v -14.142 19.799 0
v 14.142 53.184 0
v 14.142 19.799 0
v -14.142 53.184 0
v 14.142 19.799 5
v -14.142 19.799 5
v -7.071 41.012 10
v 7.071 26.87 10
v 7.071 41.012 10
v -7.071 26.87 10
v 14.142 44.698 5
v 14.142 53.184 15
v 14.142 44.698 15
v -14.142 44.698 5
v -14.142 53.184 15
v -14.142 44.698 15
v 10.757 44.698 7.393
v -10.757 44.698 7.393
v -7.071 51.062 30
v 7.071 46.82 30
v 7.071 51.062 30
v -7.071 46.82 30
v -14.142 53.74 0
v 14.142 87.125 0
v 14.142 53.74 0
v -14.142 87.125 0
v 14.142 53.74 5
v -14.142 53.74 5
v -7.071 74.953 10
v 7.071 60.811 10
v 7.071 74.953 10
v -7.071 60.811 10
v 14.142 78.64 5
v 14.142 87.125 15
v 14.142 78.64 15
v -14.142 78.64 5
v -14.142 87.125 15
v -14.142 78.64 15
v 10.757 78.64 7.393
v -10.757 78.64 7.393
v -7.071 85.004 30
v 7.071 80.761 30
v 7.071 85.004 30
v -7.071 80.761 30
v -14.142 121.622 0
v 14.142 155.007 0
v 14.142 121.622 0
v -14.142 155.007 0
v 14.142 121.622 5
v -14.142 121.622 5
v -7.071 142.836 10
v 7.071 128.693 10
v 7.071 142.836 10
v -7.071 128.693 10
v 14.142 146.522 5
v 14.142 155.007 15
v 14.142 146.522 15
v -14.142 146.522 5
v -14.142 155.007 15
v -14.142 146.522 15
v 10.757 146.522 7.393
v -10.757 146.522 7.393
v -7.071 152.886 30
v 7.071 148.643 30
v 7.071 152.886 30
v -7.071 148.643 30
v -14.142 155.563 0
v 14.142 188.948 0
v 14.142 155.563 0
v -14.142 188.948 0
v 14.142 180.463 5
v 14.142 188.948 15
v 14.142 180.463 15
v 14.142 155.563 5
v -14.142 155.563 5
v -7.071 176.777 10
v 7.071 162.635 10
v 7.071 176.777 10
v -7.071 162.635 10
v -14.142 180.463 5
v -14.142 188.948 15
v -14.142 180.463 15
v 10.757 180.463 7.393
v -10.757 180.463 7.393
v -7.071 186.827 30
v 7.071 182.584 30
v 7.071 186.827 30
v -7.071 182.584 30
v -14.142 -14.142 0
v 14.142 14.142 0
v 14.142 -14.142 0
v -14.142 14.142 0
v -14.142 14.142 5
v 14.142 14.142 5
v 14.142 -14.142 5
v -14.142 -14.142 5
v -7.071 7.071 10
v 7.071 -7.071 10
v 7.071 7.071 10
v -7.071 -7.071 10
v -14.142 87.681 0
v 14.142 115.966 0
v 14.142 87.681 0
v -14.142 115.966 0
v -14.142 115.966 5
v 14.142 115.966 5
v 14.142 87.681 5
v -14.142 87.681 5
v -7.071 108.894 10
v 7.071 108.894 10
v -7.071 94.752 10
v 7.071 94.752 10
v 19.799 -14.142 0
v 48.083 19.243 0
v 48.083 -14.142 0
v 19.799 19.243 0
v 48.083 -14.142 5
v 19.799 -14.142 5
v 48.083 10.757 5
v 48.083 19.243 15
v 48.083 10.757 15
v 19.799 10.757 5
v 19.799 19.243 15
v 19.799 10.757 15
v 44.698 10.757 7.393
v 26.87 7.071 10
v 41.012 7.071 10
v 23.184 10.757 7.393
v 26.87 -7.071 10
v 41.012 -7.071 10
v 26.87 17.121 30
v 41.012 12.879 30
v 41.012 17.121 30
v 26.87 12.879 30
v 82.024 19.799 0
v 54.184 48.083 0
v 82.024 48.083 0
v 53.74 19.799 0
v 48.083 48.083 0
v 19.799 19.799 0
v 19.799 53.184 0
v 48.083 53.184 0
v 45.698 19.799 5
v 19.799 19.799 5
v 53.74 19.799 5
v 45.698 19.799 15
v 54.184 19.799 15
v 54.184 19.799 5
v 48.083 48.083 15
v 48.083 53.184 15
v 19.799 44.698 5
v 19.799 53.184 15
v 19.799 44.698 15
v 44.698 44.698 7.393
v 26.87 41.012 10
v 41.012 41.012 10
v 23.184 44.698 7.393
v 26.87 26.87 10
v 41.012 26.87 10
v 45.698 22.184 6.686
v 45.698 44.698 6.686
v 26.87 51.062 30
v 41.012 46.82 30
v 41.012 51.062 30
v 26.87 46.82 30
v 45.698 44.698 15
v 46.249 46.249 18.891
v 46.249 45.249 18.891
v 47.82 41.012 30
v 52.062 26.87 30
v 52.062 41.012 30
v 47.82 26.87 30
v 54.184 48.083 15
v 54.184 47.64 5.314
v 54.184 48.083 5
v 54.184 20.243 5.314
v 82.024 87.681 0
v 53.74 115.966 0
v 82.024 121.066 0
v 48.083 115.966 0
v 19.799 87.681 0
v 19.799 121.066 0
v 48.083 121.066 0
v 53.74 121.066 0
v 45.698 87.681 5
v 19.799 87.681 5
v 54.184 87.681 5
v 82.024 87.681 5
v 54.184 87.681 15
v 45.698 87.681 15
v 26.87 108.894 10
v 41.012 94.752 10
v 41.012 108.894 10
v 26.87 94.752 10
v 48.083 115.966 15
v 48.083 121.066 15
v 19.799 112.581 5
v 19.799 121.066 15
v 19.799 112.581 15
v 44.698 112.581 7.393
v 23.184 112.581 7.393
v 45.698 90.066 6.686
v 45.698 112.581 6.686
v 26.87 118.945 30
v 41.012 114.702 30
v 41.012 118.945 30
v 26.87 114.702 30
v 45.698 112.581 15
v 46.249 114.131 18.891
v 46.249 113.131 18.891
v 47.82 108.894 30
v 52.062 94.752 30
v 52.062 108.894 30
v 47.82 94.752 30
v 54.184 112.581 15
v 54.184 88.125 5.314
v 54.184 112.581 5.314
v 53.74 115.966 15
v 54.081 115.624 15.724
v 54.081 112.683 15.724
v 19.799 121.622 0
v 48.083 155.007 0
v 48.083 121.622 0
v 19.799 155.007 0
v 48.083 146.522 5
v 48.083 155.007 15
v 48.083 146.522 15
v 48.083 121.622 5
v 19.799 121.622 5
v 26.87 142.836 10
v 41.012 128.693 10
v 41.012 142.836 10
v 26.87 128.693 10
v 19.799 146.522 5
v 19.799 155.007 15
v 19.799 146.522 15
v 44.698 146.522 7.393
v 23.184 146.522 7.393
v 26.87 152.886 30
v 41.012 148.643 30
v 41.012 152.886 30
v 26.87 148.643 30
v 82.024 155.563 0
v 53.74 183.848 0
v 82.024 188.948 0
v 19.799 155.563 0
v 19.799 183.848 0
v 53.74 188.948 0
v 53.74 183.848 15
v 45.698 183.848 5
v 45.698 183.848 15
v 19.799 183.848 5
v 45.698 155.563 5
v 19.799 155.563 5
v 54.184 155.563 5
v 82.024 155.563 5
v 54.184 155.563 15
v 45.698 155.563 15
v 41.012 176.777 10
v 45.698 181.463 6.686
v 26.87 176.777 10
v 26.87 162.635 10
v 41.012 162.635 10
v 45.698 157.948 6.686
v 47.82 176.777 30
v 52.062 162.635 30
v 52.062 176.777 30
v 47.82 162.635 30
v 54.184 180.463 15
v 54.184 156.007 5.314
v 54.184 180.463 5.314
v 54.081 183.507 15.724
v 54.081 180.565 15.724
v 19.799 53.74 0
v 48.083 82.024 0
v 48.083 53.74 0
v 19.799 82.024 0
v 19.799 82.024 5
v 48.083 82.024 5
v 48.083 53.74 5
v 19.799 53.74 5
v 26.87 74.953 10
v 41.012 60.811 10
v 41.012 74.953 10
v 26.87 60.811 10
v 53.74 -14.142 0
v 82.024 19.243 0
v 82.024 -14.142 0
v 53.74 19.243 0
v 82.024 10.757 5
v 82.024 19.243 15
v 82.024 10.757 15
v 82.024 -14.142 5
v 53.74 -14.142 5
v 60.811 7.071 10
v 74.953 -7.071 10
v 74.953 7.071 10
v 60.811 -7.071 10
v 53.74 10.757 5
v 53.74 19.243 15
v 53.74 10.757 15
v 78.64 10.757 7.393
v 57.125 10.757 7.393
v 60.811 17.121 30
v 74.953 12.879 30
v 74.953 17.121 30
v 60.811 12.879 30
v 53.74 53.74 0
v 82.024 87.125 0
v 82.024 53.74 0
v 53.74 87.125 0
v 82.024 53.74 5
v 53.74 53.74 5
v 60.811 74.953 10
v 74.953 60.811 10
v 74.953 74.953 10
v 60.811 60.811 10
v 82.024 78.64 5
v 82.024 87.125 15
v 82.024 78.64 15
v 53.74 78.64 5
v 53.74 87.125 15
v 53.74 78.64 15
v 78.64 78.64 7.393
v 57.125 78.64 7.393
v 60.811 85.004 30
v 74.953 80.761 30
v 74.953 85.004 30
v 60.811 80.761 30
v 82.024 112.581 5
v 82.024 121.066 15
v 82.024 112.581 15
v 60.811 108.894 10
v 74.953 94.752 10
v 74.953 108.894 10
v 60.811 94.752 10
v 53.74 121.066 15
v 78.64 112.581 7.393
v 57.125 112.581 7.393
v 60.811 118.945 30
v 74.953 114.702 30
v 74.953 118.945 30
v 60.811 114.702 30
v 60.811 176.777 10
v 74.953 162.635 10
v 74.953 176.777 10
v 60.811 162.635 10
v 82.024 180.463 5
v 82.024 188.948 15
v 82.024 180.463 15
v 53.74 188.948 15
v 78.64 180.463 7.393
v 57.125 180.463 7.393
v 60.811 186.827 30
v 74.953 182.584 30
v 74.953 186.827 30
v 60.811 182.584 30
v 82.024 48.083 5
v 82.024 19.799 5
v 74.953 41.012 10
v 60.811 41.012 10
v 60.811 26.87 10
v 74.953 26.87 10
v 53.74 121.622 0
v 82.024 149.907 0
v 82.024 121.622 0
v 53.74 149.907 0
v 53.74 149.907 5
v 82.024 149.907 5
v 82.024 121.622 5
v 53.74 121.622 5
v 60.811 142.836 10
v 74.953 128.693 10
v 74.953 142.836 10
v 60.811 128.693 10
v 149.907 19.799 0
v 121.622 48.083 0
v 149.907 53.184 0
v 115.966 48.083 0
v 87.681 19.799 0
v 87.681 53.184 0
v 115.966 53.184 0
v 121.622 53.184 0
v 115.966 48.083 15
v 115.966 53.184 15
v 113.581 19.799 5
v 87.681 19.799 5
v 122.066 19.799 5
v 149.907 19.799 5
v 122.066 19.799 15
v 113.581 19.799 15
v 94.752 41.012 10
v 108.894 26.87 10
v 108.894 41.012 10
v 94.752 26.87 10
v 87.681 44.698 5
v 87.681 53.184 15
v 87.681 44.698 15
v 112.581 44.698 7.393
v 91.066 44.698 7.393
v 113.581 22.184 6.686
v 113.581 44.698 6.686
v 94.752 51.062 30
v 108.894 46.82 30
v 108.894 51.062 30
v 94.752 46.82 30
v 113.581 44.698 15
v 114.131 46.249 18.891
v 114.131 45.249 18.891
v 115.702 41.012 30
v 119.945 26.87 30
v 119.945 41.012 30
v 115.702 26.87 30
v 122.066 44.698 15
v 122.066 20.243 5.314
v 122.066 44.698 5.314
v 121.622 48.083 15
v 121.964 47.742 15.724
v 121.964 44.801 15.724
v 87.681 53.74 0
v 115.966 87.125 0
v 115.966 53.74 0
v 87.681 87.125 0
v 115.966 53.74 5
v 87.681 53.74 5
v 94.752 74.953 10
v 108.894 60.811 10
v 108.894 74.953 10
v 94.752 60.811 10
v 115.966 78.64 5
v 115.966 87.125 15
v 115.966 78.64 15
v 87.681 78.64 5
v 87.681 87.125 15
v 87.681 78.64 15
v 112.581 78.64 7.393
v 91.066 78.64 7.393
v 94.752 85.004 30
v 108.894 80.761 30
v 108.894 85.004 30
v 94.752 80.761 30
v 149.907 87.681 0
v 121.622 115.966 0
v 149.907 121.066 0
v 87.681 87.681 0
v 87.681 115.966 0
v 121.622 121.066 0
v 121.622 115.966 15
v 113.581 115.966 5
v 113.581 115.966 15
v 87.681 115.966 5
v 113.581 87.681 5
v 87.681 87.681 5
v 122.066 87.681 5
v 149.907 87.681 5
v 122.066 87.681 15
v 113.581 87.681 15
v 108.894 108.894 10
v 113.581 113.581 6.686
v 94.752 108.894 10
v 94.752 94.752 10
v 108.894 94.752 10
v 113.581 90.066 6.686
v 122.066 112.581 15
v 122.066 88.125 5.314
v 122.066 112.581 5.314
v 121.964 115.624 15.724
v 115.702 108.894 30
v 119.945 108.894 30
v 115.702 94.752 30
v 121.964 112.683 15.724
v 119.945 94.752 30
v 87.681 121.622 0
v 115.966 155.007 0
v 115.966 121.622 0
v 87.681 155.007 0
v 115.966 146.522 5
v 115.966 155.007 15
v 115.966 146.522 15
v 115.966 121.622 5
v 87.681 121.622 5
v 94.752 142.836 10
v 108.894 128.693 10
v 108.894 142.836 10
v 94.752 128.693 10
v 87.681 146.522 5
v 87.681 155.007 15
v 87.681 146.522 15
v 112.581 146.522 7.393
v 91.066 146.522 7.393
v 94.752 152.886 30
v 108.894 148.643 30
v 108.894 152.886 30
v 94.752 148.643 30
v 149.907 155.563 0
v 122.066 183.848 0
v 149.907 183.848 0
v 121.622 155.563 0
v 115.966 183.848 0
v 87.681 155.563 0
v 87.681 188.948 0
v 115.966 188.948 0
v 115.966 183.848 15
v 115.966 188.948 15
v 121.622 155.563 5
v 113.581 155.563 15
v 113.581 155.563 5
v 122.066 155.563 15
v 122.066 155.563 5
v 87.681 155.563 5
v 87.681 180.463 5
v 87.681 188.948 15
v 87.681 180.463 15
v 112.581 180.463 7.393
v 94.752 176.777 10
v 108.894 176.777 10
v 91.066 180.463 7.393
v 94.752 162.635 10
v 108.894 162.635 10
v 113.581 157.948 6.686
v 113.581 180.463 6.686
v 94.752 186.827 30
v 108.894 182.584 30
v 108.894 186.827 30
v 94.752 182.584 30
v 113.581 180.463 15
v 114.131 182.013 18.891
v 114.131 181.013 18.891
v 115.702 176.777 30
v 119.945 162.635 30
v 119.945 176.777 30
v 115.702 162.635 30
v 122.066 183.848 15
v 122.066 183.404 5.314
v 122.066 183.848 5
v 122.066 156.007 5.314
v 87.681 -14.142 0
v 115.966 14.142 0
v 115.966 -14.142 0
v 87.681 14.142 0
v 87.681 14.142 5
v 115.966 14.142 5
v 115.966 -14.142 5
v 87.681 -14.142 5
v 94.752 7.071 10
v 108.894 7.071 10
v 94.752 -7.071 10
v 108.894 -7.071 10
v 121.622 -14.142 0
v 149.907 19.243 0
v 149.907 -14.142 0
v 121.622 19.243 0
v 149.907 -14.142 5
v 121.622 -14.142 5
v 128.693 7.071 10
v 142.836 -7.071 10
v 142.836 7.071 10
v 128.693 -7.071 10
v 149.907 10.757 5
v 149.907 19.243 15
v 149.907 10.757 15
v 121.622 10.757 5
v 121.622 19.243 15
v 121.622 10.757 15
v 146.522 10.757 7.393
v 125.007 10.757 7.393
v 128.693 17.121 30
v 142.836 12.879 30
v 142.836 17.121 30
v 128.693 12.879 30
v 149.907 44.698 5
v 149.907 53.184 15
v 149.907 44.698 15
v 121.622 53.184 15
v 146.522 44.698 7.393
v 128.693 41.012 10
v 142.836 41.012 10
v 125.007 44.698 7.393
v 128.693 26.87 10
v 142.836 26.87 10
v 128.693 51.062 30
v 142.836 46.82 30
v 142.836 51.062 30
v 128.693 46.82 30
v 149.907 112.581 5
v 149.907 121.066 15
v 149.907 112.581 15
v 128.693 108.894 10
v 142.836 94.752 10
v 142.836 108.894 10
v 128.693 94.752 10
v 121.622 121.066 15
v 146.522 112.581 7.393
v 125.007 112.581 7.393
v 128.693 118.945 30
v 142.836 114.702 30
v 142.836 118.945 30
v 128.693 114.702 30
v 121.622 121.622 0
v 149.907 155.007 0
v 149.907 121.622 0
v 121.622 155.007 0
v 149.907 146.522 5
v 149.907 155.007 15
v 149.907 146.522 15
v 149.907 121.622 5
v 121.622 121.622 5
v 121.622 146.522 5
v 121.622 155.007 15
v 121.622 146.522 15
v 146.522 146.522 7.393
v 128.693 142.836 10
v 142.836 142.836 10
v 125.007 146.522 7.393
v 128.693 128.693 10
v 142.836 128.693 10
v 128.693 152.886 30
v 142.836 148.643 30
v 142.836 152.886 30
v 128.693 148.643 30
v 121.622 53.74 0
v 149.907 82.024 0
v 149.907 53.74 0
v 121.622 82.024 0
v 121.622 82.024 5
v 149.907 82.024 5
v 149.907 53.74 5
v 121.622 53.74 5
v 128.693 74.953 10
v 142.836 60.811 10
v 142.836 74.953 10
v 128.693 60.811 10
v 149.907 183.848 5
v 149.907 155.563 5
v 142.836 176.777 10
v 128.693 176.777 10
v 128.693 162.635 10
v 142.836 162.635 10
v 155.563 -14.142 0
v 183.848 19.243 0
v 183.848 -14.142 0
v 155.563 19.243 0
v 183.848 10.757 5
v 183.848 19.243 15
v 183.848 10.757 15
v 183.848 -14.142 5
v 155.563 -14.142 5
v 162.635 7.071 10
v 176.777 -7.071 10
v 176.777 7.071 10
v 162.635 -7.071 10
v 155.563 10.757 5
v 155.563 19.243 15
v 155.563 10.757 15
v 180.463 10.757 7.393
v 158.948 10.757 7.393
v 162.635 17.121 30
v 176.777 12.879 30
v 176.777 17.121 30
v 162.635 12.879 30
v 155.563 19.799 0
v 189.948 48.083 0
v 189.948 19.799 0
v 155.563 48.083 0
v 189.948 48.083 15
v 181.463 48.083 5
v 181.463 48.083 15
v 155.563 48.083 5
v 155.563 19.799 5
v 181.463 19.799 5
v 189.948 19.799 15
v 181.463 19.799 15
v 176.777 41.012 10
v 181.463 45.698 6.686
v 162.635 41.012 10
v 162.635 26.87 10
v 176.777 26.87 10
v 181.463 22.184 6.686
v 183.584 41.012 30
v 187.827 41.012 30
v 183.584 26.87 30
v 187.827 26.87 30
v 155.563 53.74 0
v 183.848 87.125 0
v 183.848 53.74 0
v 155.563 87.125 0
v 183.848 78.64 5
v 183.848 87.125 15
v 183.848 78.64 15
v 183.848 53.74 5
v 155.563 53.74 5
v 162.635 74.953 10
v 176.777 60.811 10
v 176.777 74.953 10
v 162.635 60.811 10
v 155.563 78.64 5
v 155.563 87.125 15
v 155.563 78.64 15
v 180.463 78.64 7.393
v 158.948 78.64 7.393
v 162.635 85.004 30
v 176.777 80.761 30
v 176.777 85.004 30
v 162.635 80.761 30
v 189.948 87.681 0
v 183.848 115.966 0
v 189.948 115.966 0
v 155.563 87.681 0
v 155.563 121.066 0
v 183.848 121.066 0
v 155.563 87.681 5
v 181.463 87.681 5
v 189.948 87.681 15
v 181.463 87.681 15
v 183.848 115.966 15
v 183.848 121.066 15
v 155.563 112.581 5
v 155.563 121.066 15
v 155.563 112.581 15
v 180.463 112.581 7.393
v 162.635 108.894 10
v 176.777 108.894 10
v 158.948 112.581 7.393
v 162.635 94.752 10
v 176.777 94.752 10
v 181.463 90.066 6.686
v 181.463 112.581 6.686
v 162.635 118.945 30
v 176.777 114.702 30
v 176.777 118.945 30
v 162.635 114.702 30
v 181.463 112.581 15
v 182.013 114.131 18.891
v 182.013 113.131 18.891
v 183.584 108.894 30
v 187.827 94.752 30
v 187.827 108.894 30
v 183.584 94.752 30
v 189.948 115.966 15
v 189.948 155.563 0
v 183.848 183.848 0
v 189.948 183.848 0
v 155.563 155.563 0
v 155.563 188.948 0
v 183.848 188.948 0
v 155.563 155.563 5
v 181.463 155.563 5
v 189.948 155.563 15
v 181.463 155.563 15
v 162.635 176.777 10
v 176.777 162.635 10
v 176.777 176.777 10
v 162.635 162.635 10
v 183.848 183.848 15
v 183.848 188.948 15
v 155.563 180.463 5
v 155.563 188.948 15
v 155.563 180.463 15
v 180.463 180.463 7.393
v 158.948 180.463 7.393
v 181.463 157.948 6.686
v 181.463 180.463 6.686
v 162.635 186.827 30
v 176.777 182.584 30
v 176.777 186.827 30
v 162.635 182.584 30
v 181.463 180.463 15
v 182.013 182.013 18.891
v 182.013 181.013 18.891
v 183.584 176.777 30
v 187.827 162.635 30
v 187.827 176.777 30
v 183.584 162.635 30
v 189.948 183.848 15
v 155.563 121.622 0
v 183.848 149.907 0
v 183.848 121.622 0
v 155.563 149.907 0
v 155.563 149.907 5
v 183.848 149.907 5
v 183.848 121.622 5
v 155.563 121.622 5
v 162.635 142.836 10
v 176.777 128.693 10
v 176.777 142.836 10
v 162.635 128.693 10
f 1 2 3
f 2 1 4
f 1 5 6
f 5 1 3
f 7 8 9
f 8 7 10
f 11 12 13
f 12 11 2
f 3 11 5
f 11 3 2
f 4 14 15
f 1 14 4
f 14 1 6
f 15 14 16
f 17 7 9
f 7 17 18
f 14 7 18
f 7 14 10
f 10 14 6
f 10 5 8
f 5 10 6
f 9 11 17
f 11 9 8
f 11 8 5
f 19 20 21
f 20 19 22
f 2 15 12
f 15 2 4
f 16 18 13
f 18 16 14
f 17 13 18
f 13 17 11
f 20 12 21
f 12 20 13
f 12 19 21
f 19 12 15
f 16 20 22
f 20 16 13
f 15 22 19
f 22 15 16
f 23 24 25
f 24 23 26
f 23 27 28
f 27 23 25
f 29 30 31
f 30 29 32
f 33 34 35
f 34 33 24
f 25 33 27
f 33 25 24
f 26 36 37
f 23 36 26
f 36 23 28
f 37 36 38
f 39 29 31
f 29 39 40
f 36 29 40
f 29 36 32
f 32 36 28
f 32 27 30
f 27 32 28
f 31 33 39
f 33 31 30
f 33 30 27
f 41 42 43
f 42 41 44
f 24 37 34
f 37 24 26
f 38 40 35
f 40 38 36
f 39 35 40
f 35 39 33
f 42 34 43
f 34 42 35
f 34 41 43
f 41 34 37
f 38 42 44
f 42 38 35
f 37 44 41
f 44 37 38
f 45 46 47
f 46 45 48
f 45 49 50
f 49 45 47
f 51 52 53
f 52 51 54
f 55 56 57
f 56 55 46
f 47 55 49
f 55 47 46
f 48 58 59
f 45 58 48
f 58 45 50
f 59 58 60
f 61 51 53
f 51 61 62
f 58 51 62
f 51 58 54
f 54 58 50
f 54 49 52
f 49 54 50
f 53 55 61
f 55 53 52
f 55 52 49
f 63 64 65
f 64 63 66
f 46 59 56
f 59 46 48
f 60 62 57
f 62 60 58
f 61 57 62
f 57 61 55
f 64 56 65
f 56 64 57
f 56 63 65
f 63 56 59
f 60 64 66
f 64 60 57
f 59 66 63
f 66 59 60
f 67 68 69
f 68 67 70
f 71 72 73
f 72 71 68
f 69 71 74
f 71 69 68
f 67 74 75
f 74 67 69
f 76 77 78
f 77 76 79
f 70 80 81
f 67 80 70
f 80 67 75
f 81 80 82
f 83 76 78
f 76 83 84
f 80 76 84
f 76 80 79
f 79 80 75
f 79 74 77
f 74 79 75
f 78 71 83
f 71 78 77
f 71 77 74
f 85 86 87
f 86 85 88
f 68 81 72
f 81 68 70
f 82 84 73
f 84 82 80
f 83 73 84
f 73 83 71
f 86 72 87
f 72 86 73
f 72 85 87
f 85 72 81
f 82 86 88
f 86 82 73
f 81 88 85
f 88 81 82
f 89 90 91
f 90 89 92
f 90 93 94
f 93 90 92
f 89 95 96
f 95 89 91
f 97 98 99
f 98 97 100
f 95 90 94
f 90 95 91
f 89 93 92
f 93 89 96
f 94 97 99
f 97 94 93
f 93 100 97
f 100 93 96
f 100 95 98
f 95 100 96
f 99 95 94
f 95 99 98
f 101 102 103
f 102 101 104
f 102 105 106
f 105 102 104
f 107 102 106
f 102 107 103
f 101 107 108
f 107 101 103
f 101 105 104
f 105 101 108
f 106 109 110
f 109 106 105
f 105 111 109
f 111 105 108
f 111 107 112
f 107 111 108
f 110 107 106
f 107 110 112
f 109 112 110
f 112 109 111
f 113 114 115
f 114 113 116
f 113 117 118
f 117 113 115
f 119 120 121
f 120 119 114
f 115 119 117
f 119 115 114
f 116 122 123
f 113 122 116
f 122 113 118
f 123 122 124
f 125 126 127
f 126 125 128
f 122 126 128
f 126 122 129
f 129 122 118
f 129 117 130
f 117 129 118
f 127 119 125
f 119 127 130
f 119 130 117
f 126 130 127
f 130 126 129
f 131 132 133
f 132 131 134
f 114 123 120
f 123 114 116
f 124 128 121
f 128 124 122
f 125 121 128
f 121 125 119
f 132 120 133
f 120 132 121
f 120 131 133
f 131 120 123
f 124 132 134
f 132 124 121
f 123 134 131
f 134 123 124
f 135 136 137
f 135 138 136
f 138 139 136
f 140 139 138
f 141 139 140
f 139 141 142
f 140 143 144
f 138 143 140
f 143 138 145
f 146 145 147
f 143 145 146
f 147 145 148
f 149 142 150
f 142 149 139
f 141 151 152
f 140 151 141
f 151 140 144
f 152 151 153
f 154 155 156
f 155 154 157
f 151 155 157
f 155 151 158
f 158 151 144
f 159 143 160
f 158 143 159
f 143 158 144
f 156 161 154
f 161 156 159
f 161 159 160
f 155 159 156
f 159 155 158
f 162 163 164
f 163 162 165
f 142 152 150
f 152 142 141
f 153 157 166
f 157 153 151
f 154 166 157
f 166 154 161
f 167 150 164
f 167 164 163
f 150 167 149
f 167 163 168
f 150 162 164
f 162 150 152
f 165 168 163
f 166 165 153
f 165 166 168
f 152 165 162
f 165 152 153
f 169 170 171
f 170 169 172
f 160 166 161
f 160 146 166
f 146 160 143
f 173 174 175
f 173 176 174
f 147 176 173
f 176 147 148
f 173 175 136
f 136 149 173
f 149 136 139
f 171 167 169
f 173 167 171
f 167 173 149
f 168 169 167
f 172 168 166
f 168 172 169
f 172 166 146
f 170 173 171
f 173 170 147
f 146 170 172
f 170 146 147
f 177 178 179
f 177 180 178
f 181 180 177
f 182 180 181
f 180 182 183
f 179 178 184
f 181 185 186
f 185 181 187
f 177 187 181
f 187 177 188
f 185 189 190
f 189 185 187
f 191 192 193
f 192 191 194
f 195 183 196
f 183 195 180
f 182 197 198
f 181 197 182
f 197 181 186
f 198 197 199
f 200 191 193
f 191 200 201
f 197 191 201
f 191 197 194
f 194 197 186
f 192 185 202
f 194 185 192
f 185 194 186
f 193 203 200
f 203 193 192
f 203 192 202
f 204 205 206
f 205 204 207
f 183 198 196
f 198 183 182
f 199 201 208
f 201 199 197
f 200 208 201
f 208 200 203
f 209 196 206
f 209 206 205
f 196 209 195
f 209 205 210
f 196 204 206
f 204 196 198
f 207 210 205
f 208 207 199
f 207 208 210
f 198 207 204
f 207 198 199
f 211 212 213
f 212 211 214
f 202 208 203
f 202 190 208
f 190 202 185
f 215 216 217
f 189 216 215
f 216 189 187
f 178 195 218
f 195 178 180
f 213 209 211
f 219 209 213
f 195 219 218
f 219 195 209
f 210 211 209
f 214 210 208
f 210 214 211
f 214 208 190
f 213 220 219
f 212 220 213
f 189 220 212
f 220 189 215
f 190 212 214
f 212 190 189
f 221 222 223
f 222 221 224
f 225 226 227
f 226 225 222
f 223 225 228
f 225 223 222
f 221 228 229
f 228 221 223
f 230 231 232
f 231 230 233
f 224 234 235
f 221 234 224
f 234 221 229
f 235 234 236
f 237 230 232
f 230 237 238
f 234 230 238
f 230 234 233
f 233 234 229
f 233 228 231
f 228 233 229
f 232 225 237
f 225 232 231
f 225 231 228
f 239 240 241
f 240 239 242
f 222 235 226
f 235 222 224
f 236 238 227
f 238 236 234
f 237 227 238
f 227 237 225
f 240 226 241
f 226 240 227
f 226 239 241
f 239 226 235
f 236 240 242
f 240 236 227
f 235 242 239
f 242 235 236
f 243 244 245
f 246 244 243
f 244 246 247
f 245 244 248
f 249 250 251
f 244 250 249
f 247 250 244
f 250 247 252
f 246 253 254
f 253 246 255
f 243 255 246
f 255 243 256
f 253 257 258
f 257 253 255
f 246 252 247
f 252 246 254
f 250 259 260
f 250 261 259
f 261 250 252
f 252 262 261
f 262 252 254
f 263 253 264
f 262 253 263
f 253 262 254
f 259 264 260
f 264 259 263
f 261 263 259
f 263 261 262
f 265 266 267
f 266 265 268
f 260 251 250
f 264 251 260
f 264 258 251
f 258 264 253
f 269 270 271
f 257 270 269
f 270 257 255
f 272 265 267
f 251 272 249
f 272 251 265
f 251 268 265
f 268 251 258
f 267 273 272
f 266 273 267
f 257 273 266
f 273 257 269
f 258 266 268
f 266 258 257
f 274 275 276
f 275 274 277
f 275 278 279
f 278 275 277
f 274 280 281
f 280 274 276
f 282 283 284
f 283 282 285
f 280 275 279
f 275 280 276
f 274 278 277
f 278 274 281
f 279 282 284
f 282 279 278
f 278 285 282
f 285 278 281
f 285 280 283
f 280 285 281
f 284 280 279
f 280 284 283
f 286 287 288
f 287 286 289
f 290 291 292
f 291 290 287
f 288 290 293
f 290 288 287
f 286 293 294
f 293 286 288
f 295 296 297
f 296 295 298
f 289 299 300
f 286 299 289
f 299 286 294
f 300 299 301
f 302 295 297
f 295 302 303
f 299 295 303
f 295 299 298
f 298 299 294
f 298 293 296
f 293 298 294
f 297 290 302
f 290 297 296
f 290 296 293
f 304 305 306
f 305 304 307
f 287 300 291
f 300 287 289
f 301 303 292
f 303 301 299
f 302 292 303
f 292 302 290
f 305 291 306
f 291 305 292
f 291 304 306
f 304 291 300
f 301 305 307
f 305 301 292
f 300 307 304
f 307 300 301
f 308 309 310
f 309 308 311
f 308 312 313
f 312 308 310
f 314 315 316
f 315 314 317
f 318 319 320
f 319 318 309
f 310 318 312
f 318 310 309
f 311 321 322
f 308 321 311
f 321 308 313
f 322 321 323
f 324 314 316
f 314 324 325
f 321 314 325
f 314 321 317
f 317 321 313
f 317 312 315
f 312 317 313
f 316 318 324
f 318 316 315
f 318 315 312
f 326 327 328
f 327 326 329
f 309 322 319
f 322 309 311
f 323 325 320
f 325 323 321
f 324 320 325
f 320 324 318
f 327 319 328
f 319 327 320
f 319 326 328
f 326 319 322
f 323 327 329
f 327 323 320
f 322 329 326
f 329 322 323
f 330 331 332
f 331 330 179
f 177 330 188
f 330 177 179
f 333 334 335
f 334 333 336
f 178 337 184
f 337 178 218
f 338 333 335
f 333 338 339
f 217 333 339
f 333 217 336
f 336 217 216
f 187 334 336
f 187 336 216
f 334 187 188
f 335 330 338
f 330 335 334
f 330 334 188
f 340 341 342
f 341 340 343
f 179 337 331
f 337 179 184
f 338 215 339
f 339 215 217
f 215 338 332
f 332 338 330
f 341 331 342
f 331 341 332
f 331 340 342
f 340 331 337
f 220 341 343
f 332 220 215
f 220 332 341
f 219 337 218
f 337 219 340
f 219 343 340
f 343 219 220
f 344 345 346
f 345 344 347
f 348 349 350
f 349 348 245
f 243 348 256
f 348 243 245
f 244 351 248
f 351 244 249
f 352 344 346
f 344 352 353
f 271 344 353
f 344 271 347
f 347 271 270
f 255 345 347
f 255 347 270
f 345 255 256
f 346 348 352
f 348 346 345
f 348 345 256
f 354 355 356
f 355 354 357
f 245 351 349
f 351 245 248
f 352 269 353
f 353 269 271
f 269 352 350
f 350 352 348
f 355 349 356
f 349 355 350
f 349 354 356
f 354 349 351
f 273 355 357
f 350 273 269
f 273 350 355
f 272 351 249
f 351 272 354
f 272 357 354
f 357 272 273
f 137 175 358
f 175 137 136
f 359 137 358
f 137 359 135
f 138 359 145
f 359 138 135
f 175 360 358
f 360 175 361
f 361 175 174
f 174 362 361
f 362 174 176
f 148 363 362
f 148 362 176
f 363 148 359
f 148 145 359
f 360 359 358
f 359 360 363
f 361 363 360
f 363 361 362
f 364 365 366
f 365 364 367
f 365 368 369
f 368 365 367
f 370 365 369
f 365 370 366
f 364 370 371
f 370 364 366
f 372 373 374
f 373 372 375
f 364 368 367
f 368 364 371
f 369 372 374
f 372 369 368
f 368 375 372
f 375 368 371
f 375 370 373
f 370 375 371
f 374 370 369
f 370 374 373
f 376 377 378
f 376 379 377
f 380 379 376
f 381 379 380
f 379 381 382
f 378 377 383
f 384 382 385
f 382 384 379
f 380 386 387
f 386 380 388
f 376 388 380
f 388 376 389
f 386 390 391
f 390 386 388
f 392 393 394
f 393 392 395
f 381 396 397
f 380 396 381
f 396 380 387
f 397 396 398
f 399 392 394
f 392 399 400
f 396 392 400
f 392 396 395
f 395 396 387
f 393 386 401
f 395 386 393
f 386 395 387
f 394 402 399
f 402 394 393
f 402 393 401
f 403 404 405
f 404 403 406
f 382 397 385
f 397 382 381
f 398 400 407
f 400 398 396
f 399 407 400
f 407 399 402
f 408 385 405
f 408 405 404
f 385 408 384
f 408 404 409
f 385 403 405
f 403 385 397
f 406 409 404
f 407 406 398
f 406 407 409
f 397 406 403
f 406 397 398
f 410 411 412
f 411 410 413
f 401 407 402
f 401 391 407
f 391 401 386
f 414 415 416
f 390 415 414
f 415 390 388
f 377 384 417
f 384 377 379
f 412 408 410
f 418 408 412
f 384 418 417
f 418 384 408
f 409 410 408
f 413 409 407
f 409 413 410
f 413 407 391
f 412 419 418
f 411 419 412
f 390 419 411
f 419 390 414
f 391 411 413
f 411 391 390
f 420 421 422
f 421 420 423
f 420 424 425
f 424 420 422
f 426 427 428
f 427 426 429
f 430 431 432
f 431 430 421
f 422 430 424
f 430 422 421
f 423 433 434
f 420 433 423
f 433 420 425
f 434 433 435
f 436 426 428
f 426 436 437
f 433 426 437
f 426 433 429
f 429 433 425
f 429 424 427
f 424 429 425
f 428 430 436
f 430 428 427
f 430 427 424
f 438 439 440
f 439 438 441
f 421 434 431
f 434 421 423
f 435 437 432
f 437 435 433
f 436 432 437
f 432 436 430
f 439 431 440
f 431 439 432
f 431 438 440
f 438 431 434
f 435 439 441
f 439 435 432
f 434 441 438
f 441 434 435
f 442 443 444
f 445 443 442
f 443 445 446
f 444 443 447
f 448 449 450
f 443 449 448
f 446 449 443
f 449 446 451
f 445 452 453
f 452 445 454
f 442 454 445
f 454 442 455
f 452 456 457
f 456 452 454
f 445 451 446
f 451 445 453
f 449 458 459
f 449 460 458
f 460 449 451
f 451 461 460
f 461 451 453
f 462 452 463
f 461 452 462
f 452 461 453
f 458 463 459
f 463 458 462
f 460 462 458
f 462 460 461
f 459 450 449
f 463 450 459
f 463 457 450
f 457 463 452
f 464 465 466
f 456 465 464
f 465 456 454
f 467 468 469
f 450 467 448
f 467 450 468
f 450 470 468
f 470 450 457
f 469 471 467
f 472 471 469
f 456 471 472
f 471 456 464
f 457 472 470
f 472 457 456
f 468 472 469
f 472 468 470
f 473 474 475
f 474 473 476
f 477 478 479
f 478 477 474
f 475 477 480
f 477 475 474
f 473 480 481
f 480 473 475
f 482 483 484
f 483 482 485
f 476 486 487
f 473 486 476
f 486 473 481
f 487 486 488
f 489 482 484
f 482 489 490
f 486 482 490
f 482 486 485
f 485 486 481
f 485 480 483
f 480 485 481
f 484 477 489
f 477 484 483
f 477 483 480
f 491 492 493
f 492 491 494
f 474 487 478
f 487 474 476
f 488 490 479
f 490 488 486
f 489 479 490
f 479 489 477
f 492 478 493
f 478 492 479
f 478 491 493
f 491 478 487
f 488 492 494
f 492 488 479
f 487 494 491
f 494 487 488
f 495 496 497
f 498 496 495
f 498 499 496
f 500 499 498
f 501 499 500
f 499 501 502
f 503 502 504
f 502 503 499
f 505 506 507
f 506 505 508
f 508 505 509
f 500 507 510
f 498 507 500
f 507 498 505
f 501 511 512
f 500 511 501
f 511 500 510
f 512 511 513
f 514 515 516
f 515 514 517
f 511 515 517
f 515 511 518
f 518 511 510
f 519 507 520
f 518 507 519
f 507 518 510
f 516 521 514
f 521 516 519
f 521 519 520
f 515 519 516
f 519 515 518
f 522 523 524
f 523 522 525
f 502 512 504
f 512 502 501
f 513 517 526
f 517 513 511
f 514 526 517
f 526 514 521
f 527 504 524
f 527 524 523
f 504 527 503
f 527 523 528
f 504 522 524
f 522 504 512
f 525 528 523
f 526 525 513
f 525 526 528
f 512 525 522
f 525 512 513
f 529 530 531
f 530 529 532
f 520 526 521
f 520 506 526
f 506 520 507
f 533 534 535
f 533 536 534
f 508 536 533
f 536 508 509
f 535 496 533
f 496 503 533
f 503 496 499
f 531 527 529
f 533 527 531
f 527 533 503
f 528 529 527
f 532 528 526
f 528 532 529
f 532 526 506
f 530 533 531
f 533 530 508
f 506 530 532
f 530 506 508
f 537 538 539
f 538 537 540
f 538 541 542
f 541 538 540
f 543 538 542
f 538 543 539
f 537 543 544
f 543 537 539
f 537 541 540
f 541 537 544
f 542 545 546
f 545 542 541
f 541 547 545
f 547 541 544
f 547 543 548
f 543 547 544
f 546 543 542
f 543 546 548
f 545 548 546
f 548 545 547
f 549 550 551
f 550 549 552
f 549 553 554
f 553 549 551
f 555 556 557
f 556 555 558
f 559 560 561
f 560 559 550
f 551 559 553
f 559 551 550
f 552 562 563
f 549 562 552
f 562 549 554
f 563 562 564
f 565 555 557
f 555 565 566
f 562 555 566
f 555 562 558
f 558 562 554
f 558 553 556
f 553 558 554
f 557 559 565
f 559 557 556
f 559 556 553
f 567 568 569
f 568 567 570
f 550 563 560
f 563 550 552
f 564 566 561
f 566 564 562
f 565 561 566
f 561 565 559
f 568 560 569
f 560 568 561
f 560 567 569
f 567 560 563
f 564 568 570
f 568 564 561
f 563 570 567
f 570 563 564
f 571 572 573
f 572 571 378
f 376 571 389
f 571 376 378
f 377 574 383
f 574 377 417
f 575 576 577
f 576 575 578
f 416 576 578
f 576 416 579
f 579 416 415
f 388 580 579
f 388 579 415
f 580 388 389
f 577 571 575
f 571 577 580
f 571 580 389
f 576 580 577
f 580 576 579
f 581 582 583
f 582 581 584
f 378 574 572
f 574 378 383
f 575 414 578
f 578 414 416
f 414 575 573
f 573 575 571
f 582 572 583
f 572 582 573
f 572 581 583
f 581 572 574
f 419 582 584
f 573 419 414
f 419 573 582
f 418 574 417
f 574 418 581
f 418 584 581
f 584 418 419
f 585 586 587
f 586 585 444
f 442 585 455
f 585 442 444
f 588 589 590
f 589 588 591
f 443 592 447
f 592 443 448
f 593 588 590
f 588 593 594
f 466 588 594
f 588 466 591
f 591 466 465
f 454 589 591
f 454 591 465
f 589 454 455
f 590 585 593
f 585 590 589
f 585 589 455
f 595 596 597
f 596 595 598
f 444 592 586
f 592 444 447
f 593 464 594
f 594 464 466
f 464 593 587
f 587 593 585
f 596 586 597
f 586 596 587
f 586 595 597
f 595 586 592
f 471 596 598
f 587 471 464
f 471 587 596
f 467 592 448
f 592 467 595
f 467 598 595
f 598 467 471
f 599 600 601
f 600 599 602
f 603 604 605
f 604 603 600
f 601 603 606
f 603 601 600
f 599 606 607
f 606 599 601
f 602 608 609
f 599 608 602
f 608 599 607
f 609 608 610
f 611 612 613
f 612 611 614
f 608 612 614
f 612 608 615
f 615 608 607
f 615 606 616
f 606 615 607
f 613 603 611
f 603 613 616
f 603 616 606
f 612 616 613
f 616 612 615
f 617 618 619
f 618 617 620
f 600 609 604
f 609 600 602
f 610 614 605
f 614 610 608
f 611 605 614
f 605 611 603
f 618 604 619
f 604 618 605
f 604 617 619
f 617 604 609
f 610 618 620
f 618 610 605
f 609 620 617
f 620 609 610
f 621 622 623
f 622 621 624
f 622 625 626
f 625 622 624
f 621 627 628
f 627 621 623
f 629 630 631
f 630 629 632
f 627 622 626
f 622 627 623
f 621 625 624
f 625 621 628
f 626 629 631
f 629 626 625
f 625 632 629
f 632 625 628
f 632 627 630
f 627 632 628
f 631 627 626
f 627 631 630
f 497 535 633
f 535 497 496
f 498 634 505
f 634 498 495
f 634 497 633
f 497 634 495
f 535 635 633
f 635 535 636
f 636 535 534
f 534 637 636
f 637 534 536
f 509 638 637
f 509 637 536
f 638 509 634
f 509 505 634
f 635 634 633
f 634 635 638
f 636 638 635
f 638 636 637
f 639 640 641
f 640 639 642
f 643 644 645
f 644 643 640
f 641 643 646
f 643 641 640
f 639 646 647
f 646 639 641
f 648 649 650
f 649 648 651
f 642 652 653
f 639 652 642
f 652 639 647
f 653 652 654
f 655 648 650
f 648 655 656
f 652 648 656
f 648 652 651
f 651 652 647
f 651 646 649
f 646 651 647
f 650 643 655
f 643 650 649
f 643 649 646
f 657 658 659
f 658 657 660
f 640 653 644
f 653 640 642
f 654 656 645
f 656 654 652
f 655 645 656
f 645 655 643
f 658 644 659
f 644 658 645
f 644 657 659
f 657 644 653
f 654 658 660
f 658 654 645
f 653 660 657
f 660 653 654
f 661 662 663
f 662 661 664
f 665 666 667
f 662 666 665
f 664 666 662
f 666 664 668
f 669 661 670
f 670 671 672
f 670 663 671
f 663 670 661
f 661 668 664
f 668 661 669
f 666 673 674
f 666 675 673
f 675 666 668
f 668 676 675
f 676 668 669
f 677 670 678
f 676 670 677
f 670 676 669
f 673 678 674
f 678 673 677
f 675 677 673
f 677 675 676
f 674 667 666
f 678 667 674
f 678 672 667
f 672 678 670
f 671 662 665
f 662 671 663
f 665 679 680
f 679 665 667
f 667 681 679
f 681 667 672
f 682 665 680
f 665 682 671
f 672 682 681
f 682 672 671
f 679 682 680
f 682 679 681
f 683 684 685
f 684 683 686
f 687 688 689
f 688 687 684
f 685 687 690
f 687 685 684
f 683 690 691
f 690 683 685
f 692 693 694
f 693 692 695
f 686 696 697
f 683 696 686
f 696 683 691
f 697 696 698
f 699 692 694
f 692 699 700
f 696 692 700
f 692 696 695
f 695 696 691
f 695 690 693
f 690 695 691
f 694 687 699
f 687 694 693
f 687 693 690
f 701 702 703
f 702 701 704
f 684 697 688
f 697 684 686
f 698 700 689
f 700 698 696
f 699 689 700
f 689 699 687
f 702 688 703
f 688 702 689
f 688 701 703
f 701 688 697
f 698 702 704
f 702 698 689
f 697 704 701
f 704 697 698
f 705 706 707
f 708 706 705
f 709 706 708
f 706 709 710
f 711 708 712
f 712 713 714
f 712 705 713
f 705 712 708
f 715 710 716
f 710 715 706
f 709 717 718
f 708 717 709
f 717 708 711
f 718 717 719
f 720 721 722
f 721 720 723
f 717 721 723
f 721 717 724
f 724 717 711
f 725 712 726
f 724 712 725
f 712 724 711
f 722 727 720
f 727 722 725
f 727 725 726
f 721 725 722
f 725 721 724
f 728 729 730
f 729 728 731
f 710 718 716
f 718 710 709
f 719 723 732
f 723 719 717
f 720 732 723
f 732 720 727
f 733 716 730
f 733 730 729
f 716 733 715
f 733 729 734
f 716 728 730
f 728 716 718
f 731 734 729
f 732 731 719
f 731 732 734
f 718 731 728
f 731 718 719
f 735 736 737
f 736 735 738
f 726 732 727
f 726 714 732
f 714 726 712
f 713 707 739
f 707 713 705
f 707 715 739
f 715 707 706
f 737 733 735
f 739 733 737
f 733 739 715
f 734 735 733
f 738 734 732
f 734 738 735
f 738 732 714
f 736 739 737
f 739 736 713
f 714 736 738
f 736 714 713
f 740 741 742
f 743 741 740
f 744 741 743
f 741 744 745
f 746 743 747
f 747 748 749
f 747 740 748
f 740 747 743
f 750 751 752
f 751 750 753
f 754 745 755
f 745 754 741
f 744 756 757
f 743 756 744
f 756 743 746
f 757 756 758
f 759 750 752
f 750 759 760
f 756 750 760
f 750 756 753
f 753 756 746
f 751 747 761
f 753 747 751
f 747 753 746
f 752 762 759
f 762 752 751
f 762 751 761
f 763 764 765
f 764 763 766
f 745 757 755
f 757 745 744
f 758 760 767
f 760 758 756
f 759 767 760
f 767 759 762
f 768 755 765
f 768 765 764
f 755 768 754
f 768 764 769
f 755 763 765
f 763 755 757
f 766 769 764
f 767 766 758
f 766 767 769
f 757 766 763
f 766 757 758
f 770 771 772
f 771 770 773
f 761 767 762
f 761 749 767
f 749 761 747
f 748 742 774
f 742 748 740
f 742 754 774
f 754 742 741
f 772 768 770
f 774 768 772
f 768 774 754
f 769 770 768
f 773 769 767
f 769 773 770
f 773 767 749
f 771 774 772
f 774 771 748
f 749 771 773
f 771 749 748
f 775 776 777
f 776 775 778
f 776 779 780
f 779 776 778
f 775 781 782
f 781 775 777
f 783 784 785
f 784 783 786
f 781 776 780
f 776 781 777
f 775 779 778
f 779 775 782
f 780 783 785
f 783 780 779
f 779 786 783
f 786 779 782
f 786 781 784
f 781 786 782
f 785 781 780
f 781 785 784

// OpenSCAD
altura = 10;
R = 20;

H1 = altura*0.5;
H2 = altura;
n=4;
module bloco(){
rotate(45)
	hull(){
		cylinder(h=H1, r=R, $fn=n);
		cylinder(h=H2, r=R/2, $fn=n);
	}
}
k=1.2;

M=5;
N=5;
for (i=[0:M]){
  for (j=[0:N]){
    translate([k*(i * R*sqrt(2)), k*sqrt(2)*R*j]){

	if((i+j)%2) color("green") bloco();
      else color("grey") bloco();

	if ((i+j)%3)
	translate([0,R/2+5])
      parede();

	if ((i*j)%2)
	translate([R/2+6,0]) rotate(90)
      parede();
    }
  }
}

module parede(){
	color([0,0.3,0.3]) scale([1, 0.3, 3]) bloco();
}
